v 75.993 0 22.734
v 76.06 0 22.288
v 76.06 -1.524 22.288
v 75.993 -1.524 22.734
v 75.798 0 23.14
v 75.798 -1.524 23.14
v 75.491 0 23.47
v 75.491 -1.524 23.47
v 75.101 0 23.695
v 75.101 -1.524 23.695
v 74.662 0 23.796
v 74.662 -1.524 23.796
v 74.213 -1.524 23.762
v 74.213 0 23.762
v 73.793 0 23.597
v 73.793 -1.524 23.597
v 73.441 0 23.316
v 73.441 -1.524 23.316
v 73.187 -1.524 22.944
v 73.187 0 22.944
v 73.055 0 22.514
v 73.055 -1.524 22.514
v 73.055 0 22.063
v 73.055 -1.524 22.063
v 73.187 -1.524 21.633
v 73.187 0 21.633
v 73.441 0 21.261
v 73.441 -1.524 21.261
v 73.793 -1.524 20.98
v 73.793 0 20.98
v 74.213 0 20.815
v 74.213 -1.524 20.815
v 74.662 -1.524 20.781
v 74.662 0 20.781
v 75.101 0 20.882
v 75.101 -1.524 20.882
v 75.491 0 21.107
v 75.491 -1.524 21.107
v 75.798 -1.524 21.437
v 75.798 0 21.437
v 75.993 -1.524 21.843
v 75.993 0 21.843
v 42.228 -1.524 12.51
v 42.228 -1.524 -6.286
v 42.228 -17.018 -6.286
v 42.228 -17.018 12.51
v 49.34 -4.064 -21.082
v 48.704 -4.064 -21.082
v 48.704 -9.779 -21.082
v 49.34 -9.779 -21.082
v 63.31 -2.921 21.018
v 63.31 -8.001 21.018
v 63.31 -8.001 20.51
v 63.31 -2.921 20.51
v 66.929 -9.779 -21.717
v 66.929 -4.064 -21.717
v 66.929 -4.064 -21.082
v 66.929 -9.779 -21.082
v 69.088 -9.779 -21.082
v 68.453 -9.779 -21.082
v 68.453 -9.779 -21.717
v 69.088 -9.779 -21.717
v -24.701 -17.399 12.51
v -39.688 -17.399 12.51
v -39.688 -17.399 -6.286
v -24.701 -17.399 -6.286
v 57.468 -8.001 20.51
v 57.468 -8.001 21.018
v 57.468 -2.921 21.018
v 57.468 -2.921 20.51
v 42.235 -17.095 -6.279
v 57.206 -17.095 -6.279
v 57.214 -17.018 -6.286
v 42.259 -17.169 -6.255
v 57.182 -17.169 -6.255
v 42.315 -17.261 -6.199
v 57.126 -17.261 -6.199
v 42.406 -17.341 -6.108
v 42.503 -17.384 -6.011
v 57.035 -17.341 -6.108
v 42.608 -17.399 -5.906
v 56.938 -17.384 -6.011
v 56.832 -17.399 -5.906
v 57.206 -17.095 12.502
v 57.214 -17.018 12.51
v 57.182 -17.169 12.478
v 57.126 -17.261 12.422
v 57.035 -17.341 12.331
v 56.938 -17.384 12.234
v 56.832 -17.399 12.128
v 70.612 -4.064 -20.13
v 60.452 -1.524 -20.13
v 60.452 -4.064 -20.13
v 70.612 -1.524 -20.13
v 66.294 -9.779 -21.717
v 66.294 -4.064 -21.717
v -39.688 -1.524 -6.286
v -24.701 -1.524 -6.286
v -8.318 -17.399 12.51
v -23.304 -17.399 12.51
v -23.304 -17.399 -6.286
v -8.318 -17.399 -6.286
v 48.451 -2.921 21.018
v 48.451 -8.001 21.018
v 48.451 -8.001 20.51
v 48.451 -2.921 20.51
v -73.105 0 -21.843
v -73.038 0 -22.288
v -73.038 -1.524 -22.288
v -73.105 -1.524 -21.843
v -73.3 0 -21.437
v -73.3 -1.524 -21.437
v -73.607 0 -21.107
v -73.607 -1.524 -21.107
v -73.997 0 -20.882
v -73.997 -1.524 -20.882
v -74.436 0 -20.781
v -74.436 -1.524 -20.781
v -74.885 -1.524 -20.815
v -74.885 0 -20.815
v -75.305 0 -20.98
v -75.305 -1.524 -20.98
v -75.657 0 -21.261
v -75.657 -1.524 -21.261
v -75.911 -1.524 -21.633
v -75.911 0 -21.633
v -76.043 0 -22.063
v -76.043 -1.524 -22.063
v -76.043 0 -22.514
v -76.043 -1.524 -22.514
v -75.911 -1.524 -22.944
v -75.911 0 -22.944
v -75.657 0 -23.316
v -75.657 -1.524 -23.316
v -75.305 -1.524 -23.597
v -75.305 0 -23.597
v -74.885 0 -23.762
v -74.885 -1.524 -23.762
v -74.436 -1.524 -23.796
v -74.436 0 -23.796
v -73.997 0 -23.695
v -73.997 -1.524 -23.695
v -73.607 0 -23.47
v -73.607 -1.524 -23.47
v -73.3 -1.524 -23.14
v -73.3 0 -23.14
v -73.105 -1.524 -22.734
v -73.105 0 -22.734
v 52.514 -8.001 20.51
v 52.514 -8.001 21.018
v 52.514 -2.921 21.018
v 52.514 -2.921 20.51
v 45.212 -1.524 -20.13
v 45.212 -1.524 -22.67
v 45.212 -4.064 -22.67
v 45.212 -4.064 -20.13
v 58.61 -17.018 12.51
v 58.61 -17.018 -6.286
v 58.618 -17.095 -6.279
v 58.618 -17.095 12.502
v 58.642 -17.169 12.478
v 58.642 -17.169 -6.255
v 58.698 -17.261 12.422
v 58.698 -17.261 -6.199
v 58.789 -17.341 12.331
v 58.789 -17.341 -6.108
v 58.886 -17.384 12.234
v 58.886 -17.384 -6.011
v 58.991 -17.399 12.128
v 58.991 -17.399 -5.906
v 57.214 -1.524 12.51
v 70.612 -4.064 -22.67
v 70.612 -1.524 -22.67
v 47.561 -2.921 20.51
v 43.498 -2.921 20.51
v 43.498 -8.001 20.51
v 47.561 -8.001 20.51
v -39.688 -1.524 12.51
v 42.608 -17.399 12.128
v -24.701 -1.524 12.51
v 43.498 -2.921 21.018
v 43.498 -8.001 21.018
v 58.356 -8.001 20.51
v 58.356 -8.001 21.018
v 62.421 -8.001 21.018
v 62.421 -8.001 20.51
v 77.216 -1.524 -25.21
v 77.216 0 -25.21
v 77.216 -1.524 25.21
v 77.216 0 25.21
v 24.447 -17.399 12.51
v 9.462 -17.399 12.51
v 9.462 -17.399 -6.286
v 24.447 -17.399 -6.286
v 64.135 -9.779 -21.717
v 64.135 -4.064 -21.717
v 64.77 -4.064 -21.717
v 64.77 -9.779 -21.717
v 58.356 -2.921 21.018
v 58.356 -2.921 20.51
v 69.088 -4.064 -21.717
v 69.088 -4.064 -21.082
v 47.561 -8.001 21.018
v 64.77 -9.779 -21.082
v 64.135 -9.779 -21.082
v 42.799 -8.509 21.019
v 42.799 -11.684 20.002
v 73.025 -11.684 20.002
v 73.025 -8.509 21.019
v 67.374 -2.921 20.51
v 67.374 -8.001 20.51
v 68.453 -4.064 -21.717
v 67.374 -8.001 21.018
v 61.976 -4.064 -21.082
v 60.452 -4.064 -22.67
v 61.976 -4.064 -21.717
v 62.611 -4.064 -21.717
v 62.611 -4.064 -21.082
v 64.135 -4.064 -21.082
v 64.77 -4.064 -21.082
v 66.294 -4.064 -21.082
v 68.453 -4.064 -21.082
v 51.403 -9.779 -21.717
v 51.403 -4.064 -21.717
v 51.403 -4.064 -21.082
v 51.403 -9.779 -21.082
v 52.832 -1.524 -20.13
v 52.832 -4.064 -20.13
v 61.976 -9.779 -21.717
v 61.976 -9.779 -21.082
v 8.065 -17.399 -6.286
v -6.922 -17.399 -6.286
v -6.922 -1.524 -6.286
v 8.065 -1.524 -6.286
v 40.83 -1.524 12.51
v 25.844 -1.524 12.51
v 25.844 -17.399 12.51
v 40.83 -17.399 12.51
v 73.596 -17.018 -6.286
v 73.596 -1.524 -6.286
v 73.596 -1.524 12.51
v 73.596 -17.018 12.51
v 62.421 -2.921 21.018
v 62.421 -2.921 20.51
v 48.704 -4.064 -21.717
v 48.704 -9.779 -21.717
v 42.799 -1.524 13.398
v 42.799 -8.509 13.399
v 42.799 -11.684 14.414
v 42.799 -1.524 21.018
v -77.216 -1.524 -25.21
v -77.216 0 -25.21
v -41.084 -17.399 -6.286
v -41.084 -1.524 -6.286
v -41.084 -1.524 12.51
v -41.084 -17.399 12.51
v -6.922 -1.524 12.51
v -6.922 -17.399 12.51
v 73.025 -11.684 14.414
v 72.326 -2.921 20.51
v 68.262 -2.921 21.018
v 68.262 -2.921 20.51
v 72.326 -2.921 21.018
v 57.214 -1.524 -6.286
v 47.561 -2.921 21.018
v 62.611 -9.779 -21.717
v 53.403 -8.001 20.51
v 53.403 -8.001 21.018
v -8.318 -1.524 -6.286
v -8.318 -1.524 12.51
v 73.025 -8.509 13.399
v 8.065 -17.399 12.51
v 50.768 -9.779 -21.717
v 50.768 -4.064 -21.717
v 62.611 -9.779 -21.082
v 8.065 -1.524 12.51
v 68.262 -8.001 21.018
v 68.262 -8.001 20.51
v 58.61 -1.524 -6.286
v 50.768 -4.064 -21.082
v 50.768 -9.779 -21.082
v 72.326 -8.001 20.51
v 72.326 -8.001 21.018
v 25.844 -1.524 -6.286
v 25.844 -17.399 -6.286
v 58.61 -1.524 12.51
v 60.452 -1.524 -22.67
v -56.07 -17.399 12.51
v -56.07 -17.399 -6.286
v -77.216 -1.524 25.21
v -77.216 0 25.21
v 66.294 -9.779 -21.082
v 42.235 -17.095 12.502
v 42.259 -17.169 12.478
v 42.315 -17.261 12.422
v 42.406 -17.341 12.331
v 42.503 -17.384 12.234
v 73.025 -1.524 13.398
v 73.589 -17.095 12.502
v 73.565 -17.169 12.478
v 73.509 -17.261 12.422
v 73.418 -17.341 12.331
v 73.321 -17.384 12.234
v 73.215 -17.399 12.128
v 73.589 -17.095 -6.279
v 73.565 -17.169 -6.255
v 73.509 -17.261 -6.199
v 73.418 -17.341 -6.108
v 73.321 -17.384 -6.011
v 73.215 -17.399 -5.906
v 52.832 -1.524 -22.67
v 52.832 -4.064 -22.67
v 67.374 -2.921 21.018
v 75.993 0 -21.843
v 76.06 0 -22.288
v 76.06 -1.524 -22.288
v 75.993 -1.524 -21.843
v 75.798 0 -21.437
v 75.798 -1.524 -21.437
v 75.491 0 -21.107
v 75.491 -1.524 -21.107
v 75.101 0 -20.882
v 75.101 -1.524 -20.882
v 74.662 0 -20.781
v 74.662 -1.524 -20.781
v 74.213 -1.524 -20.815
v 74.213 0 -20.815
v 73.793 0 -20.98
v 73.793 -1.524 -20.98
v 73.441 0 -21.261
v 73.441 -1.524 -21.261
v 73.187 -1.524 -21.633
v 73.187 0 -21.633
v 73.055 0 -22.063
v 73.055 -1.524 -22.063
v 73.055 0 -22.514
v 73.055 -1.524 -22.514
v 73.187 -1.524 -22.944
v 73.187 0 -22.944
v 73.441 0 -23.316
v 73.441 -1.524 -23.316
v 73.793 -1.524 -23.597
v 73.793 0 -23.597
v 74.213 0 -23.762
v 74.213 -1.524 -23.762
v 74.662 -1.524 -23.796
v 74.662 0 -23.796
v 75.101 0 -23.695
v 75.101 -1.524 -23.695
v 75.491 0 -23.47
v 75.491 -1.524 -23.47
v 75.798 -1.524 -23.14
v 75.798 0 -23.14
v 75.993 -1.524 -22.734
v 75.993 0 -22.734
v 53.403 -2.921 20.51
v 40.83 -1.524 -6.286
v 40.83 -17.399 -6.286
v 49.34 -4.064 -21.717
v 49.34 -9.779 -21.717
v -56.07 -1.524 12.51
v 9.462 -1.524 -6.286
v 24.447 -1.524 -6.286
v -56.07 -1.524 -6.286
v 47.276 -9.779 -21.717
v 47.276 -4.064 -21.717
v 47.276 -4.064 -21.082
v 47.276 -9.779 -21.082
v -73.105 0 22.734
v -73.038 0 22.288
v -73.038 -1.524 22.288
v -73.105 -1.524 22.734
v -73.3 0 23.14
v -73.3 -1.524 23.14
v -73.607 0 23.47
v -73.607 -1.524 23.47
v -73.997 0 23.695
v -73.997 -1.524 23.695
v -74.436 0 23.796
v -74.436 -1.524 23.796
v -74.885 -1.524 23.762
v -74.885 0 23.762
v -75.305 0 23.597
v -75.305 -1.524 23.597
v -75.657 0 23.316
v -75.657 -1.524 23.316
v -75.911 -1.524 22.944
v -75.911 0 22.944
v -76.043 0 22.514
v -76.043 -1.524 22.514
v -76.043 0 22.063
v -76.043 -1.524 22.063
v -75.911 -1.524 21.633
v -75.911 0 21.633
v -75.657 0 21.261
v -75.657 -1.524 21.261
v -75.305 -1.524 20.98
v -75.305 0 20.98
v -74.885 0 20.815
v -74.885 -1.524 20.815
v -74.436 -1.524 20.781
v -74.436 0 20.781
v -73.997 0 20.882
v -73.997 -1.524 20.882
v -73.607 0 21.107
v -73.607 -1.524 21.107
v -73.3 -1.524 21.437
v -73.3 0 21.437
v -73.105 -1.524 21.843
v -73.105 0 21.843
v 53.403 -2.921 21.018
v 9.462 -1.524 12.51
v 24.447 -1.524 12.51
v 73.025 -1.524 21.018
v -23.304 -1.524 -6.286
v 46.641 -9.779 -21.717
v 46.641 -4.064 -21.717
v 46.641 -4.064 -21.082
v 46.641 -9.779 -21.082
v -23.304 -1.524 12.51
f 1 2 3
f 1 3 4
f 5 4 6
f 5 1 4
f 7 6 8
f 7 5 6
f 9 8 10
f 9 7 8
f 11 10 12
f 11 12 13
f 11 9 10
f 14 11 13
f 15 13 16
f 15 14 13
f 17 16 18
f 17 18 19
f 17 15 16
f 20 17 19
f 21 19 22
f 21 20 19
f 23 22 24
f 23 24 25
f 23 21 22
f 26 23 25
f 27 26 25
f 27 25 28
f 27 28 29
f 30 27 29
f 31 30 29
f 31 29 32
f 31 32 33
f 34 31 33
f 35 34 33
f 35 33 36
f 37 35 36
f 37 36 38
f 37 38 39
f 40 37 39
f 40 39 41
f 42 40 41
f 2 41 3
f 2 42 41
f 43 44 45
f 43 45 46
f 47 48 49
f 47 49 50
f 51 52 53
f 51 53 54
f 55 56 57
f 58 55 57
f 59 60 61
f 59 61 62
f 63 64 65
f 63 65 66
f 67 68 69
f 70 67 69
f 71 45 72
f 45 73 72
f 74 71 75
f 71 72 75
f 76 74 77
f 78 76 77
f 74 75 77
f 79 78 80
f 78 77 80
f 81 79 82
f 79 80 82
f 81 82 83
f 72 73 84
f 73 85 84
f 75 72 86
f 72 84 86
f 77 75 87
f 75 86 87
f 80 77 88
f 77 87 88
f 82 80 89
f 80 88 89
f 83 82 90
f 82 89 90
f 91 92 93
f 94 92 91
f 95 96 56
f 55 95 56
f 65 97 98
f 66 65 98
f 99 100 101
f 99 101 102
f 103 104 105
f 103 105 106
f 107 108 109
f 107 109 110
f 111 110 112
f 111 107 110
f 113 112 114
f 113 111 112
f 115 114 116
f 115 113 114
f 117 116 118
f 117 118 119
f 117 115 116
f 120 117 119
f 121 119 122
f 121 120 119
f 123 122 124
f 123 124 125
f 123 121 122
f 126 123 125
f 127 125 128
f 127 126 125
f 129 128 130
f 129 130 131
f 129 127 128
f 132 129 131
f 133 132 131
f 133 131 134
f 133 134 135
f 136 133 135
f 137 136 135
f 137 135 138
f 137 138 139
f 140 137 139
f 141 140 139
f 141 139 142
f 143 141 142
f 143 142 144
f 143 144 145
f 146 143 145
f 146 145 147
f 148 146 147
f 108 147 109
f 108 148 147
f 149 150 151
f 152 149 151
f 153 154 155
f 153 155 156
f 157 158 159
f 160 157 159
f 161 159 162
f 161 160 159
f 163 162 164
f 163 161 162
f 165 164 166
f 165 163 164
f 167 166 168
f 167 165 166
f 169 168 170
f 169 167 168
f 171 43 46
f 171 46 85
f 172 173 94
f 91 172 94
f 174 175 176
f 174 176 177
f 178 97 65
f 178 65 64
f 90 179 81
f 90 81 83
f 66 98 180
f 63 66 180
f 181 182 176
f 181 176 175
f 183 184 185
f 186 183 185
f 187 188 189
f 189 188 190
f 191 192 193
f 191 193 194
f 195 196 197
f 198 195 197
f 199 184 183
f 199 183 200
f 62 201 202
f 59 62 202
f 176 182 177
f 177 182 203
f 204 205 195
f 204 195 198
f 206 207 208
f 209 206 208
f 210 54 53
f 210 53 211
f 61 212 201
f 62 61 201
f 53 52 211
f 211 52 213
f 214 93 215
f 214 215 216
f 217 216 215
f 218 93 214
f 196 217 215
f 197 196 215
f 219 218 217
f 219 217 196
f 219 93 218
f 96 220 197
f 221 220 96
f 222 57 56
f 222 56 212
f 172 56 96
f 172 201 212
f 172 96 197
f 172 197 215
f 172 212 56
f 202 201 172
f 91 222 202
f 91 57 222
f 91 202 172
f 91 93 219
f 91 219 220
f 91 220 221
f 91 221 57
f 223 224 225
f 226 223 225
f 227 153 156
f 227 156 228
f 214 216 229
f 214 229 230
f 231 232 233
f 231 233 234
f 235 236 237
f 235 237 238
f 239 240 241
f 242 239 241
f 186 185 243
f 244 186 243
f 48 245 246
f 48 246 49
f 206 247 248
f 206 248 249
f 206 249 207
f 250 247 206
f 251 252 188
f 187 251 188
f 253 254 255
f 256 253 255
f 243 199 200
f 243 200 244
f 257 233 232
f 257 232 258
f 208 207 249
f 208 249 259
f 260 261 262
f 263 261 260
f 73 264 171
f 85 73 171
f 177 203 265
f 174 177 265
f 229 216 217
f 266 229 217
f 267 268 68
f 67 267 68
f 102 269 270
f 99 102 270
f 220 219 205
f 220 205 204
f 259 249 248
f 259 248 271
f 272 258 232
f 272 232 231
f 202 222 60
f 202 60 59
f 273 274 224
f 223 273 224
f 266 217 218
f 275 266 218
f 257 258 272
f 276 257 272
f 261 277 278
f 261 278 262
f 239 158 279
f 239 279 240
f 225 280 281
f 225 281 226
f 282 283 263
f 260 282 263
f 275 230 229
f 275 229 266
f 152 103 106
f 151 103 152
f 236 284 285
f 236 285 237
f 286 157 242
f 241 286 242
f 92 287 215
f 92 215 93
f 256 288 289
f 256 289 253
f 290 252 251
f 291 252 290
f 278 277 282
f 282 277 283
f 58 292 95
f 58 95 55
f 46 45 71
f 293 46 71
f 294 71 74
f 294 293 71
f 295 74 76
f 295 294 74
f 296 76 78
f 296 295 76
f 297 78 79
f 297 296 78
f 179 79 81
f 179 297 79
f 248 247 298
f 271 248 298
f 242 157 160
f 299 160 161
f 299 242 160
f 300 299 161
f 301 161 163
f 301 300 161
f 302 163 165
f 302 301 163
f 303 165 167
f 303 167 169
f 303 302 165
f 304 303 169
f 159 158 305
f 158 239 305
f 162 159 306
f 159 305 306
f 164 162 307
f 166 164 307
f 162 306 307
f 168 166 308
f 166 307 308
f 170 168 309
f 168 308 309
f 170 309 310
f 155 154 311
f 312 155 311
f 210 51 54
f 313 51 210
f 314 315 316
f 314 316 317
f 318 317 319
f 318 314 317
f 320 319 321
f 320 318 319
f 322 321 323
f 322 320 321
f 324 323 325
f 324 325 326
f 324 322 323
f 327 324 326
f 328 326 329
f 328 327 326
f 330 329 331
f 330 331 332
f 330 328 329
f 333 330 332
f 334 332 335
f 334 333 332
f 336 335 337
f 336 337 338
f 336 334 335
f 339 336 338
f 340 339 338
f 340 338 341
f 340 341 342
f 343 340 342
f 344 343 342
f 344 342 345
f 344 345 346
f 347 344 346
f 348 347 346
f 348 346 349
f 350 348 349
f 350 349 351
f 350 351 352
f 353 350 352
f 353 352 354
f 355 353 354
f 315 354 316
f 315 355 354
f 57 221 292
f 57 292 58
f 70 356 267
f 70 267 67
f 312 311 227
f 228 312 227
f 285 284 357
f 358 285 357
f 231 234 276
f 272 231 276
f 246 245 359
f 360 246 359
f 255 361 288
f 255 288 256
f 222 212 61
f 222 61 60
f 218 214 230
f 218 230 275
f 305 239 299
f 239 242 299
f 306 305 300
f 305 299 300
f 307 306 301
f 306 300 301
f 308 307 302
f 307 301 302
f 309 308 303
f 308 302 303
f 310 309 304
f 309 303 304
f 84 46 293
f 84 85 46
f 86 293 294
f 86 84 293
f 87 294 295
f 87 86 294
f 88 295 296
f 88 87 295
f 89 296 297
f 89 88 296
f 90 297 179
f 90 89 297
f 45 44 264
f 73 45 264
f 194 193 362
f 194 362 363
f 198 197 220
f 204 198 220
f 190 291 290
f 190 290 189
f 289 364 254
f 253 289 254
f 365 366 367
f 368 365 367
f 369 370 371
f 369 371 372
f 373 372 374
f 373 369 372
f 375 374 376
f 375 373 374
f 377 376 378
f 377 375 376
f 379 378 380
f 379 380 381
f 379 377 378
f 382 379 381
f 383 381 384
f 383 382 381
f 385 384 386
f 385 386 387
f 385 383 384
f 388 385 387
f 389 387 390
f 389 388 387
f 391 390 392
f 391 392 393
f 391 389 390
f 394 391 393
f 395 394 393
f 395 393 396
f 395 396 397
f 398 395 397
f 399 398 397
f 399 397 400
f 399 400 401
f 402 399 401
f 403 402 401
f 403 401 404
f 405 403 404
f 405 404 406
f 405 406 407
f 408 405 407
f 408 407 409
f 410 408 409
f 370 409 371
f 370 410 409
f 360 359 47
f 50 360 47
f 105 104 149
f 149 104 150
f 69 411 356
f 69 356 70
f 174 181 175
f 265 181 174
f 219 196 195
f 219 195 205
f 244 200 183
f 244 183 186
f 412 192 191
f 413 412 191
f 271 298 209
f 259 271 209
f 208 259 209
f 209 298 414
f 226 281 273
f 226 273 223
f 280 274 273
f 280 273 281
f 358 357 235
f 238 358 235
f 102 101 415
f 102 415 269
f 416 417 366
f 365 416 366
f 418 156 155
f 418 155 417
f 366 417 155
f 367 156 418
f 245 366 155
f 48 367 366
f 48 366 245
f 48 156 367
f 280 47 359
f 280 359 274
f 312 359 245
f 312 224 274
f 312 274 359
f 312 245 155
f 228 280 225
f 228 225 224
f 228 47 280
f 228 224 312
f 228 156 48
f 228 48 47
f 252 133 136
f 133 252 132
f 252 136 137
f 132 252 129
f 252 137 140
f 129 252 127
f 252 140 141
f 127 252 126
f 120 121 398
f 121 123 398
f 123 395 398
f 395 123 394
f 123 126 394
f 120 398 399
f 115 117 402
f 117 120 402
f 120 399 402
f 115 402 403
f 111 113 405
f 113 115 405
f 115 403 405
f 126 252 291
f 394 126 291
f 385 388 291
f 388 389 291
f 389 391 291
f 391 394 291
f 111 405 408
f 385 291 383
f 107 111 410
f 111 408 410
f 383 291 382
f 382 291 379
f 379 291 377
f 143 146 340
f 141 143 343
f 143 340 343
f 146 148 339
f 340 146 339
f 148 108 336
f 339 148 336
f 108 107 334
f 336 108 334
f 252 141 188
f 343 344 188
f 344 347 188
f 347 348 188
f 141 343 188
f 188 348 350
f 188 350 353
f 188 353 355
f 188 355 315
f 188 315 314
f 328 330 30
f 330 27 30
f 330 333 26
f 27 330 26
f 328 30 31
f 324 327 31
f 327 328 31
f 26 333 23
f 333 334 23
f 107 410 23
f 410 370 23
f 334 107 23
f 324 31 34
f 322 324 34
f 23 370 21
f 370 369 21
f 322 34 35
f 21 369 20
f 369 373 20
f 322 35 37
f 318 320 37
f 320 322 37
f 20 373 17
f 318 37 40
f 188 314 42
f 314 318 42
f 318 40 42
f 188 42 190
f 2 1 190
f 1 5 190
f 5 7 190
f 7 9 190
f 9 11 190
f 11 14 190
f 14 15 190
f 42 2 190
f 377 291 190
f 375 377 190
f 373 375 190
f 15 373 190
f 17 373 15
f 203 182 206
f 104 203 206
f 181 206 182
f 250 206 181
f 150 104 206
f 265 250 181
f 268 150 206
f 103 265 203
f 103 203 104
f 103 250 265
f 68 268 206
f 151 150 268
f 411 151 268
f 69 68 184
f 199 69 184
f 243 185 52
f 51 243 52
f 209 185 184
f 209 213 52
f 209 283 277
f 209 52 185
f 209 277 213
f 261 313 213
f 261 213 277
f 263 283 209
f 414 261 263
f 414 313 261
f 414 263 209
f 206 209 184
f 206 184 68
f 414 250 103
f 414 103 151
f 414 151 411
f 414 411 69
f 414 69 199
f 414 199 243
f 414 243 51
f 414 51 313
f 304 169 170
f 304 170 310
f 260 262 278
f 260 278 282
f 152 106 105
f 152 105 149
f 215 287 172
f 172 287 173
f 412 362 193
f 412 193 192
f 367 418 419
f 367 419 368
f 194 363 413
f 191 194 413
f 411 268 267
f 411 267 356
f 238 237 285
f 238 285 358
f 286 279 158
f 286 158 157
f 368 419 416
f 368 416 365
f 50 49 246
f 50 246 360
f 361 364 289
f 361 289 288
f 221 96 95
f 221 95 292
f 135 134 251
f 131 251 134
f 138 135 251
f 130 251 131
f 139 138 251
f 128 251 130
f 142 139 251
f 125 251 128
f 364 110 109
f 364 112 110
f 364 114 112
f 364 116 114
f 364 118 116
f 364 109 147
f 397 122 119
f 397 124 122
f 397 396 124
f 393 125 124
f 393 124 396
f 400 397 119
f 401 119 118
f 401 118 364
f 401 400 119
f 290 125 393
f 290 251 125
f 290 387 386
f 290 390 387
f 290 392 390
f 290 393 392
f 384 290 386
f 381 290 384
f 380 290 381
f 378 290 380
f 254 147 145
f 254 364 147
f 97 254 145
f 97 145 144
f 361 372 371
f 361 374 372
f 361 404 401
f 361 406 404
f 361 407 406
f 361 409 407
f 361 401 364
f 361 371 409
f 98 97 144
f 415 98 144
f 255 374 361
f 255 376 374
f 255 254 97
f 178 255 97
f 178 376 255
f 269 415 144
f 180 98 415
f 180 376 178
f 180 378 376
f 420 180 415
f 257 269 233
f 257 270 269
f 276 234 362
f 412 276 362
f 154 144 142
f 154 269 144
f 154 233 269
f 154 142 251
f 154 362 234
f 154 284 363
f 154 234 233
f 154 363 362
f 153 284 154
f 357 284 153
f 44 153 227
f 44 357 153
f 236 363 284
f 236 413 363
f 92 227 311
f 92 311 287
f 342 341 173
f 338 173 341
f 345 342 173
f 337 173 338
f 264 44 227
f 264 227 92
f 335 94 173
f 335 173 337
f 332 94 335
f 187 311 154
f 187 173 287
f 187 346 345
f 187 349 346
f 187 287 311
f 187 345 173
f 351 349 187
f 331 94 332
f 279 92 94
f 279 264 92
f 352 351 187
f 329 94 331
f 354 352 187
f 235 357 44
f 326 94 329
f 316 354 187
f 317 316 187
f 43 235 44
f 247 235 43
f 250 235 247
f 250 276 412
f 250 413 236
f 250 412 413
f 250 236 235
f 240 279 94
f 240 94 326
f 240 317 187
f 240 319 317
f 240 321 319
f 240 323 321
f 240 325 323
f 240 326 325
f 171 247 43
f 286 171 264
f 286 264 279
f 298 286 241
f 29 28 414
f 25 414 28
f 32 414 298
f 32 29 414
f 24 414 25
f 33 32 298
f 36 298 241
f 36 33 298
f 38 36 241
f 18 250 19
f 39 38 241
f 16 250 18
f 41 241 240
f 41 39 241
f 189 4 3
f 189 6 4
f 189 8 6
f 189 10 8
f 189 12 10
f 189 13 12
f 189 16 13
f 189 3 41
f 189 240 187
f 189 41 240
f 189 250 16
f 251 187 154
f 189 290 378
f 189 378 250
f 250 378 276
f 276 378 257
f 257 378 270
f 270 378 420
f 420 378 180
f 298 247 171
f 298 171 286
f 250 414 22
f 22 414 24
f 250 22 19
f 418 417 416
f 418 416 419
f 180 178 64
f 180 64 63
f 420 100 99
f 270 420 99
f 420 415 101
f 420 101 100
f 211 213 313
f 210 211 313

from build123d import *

# Parameters (mm, degrees)
F0_W      = 154.432
F0_H      = 50.419
F0_R      = 1.5113
F1_DEPTH  = 1.524
F2_W      = 14.986
F2_H      = 18.796
F3_DEPTH  = 15.875
F4_R      = 0.381
F5_W      = 30.226
F5_H      = 7.62
F6_DEPTH  = 10.16
F7_SIZE2  = 1.016
F7_SIZE   = 3.175
F8_W      = 4.064
F8_H      = 5.08
F9_DEPTH  = 0.508
F10_W     = 7.62
F10_H     = 2.54
F10_W_2   = 10.16
F11_DEPTH = 2.54
F12_W     = 0.635
F12_H     = 0.635
F13_DEPTH = 5.715


with BuildPart() as f1:
    # F0 (on Front) → F1 (new body)
    with BuildSketch(Plane.XZ):
        Rectangle(F0_W, F0_H)
        with Locations((-74.549, -22.2885)):
            Circle(F0_R, mode=Mode.SUBTRACT)
        with Locations((74.549, -22.2885)):
            Circle(F0_R, mode=Mode.SUBTRACT)
        with Locations((-74.549, 22.2885)):
            Circle(F0_R, mode=Mode.SUBTRACT)
        with Locations((74.549, 22.2885)):
            Circle(F0_R, mode=Mode.SUBTRACT)
    extrude(amount=F1_DEPTH)

    # F2 (on face) → F3 (join)
    with BuildSketch(Plane.XZ.offset(1.524)):
        with Locations((49.7205, 3.1115)):
            Rectangle(F2_W, F2_H)
        with Locations((66.1035, 3.1115)):
            Rectangle(F2_W, F2_H)
        with Locations((33.3375, 3.1115)):
            Rectangle(F2_W, F2_H)
        with Locations((16.9545, 3.1115)):
            Rectangle(F2_W, F2_H)
        with Locations((0.5715, 3.1115)):
            Rectangle(F2_W, F2_H)
        with Locations((-15.8115, 3.1115)):
            Rectangle(F2_W, F2_H)
        with Locations((-32.1945, 3.1115)):
            Rectangle(F2_W, F2_H)
        with Locations((-48.5775, 3.1115)):
            Rectangle(F2_W, F2_H)
    extrude(amount=F3_DEPTH)

    # F4
    f4_edges = [f1.edges().sort_by_distance(p)[0] for p in [
        (42.2275, -17.399, 3.1115),
        (49.7205, -17.399, -6.2865),
        (57.2135, -17.399, 3.1115),
        (49.7205, -17.399, 12.5095),
        (58.6105, -17.399, 3.1115),
        (66.1035, -17.399, -6.2865),
        (73.5965, -17.399, 3.1115),
        (66.1035, -17.399, 12.5095),
    ]]
    fillet(f4_edges, radius=F4_R)

    # F5 (on face) → F6 (join)
    with BuildSketch(Plane.XZ.offset(1.524)):
        with Locations((57.912, 17.2085)):
            Rectangle(F5_W, F5_H)
    extrude(amount=F6_DEPTH)

    # F7
    f7_edges = [f1.edges().sort_by_distance(p)[0] for p in [
        (57.912, -11.684, 21.0185),
        (57.912, -11.684, 13.3985),
    ]]
    chamfer(f7_edges, length=F7_SIZE, length2=F7_SIZE2)

    # F8 (on face) → F9 (cut)
    with BuildSketch(Plane.XY.offset(21.0185)):
        with Locations((45.5295, -5.461)):
            Rectangle(F8_W, F8_H)
        with Locations((50.4825, -5.461)):
            Rectangle(F8_W, F8_H)
        with Locations((55.4355, -5.461)):
            Rectangle(F8_W, F8_H)
        with Locations((60.3885, -5.461)):
            Rectangle(F8_W, F8_H)
        with Locations((65.3415, -5.461)):
            Rectangle(F8_W, F8_H)
        with Locations((70.2945, -5.461)):
            Rectangle(F8_W, F8_H)
    extrude(amount=-F9_DEPTH, mode=Mode.SUBTRACT)

    # F10 (on face) → F11 (join)
    with BuildSketch(Plane.XZ.offset(1.524)):
        with Locations((49.022, -21.3995)):
            Rectangle(F10_W, F10_H)
        with Locations((65.532, -21.3995)):
            Rectangle(F10_W_2, F10_H)
    extrude(amount=F11_DEPTH)

    # F12 (on face) → F13 (join)
    with BuildSketch(Plane.XZ.offset(4.064)):
        with Locations((62.2935, -21.3995)):
            Rectangle(F12_W, F12_H)
        with Locations((64.4525, -21.3995)):
            Rectangle(F12_W, F12_H)
        with Locations((66.6115, -21.3995)):
            Rectangle(F12_W, F12_H)
        with Locations((68.7705, -21.3995)):
            Rectangle(F12_W, F12_H)
        with Locations((51.08575, -21.3995)):
            Rectangle(F12_W, F12_H)
        with Locations((49.022, -21.3995)):
            Rectangle(F12_W, F12_H)
        with Locations((46.95825, -21.3995)):
            Rectangle(F12_W, F12_H)
    extrude(amount=F13_DEPTH)


solid = f1.part
